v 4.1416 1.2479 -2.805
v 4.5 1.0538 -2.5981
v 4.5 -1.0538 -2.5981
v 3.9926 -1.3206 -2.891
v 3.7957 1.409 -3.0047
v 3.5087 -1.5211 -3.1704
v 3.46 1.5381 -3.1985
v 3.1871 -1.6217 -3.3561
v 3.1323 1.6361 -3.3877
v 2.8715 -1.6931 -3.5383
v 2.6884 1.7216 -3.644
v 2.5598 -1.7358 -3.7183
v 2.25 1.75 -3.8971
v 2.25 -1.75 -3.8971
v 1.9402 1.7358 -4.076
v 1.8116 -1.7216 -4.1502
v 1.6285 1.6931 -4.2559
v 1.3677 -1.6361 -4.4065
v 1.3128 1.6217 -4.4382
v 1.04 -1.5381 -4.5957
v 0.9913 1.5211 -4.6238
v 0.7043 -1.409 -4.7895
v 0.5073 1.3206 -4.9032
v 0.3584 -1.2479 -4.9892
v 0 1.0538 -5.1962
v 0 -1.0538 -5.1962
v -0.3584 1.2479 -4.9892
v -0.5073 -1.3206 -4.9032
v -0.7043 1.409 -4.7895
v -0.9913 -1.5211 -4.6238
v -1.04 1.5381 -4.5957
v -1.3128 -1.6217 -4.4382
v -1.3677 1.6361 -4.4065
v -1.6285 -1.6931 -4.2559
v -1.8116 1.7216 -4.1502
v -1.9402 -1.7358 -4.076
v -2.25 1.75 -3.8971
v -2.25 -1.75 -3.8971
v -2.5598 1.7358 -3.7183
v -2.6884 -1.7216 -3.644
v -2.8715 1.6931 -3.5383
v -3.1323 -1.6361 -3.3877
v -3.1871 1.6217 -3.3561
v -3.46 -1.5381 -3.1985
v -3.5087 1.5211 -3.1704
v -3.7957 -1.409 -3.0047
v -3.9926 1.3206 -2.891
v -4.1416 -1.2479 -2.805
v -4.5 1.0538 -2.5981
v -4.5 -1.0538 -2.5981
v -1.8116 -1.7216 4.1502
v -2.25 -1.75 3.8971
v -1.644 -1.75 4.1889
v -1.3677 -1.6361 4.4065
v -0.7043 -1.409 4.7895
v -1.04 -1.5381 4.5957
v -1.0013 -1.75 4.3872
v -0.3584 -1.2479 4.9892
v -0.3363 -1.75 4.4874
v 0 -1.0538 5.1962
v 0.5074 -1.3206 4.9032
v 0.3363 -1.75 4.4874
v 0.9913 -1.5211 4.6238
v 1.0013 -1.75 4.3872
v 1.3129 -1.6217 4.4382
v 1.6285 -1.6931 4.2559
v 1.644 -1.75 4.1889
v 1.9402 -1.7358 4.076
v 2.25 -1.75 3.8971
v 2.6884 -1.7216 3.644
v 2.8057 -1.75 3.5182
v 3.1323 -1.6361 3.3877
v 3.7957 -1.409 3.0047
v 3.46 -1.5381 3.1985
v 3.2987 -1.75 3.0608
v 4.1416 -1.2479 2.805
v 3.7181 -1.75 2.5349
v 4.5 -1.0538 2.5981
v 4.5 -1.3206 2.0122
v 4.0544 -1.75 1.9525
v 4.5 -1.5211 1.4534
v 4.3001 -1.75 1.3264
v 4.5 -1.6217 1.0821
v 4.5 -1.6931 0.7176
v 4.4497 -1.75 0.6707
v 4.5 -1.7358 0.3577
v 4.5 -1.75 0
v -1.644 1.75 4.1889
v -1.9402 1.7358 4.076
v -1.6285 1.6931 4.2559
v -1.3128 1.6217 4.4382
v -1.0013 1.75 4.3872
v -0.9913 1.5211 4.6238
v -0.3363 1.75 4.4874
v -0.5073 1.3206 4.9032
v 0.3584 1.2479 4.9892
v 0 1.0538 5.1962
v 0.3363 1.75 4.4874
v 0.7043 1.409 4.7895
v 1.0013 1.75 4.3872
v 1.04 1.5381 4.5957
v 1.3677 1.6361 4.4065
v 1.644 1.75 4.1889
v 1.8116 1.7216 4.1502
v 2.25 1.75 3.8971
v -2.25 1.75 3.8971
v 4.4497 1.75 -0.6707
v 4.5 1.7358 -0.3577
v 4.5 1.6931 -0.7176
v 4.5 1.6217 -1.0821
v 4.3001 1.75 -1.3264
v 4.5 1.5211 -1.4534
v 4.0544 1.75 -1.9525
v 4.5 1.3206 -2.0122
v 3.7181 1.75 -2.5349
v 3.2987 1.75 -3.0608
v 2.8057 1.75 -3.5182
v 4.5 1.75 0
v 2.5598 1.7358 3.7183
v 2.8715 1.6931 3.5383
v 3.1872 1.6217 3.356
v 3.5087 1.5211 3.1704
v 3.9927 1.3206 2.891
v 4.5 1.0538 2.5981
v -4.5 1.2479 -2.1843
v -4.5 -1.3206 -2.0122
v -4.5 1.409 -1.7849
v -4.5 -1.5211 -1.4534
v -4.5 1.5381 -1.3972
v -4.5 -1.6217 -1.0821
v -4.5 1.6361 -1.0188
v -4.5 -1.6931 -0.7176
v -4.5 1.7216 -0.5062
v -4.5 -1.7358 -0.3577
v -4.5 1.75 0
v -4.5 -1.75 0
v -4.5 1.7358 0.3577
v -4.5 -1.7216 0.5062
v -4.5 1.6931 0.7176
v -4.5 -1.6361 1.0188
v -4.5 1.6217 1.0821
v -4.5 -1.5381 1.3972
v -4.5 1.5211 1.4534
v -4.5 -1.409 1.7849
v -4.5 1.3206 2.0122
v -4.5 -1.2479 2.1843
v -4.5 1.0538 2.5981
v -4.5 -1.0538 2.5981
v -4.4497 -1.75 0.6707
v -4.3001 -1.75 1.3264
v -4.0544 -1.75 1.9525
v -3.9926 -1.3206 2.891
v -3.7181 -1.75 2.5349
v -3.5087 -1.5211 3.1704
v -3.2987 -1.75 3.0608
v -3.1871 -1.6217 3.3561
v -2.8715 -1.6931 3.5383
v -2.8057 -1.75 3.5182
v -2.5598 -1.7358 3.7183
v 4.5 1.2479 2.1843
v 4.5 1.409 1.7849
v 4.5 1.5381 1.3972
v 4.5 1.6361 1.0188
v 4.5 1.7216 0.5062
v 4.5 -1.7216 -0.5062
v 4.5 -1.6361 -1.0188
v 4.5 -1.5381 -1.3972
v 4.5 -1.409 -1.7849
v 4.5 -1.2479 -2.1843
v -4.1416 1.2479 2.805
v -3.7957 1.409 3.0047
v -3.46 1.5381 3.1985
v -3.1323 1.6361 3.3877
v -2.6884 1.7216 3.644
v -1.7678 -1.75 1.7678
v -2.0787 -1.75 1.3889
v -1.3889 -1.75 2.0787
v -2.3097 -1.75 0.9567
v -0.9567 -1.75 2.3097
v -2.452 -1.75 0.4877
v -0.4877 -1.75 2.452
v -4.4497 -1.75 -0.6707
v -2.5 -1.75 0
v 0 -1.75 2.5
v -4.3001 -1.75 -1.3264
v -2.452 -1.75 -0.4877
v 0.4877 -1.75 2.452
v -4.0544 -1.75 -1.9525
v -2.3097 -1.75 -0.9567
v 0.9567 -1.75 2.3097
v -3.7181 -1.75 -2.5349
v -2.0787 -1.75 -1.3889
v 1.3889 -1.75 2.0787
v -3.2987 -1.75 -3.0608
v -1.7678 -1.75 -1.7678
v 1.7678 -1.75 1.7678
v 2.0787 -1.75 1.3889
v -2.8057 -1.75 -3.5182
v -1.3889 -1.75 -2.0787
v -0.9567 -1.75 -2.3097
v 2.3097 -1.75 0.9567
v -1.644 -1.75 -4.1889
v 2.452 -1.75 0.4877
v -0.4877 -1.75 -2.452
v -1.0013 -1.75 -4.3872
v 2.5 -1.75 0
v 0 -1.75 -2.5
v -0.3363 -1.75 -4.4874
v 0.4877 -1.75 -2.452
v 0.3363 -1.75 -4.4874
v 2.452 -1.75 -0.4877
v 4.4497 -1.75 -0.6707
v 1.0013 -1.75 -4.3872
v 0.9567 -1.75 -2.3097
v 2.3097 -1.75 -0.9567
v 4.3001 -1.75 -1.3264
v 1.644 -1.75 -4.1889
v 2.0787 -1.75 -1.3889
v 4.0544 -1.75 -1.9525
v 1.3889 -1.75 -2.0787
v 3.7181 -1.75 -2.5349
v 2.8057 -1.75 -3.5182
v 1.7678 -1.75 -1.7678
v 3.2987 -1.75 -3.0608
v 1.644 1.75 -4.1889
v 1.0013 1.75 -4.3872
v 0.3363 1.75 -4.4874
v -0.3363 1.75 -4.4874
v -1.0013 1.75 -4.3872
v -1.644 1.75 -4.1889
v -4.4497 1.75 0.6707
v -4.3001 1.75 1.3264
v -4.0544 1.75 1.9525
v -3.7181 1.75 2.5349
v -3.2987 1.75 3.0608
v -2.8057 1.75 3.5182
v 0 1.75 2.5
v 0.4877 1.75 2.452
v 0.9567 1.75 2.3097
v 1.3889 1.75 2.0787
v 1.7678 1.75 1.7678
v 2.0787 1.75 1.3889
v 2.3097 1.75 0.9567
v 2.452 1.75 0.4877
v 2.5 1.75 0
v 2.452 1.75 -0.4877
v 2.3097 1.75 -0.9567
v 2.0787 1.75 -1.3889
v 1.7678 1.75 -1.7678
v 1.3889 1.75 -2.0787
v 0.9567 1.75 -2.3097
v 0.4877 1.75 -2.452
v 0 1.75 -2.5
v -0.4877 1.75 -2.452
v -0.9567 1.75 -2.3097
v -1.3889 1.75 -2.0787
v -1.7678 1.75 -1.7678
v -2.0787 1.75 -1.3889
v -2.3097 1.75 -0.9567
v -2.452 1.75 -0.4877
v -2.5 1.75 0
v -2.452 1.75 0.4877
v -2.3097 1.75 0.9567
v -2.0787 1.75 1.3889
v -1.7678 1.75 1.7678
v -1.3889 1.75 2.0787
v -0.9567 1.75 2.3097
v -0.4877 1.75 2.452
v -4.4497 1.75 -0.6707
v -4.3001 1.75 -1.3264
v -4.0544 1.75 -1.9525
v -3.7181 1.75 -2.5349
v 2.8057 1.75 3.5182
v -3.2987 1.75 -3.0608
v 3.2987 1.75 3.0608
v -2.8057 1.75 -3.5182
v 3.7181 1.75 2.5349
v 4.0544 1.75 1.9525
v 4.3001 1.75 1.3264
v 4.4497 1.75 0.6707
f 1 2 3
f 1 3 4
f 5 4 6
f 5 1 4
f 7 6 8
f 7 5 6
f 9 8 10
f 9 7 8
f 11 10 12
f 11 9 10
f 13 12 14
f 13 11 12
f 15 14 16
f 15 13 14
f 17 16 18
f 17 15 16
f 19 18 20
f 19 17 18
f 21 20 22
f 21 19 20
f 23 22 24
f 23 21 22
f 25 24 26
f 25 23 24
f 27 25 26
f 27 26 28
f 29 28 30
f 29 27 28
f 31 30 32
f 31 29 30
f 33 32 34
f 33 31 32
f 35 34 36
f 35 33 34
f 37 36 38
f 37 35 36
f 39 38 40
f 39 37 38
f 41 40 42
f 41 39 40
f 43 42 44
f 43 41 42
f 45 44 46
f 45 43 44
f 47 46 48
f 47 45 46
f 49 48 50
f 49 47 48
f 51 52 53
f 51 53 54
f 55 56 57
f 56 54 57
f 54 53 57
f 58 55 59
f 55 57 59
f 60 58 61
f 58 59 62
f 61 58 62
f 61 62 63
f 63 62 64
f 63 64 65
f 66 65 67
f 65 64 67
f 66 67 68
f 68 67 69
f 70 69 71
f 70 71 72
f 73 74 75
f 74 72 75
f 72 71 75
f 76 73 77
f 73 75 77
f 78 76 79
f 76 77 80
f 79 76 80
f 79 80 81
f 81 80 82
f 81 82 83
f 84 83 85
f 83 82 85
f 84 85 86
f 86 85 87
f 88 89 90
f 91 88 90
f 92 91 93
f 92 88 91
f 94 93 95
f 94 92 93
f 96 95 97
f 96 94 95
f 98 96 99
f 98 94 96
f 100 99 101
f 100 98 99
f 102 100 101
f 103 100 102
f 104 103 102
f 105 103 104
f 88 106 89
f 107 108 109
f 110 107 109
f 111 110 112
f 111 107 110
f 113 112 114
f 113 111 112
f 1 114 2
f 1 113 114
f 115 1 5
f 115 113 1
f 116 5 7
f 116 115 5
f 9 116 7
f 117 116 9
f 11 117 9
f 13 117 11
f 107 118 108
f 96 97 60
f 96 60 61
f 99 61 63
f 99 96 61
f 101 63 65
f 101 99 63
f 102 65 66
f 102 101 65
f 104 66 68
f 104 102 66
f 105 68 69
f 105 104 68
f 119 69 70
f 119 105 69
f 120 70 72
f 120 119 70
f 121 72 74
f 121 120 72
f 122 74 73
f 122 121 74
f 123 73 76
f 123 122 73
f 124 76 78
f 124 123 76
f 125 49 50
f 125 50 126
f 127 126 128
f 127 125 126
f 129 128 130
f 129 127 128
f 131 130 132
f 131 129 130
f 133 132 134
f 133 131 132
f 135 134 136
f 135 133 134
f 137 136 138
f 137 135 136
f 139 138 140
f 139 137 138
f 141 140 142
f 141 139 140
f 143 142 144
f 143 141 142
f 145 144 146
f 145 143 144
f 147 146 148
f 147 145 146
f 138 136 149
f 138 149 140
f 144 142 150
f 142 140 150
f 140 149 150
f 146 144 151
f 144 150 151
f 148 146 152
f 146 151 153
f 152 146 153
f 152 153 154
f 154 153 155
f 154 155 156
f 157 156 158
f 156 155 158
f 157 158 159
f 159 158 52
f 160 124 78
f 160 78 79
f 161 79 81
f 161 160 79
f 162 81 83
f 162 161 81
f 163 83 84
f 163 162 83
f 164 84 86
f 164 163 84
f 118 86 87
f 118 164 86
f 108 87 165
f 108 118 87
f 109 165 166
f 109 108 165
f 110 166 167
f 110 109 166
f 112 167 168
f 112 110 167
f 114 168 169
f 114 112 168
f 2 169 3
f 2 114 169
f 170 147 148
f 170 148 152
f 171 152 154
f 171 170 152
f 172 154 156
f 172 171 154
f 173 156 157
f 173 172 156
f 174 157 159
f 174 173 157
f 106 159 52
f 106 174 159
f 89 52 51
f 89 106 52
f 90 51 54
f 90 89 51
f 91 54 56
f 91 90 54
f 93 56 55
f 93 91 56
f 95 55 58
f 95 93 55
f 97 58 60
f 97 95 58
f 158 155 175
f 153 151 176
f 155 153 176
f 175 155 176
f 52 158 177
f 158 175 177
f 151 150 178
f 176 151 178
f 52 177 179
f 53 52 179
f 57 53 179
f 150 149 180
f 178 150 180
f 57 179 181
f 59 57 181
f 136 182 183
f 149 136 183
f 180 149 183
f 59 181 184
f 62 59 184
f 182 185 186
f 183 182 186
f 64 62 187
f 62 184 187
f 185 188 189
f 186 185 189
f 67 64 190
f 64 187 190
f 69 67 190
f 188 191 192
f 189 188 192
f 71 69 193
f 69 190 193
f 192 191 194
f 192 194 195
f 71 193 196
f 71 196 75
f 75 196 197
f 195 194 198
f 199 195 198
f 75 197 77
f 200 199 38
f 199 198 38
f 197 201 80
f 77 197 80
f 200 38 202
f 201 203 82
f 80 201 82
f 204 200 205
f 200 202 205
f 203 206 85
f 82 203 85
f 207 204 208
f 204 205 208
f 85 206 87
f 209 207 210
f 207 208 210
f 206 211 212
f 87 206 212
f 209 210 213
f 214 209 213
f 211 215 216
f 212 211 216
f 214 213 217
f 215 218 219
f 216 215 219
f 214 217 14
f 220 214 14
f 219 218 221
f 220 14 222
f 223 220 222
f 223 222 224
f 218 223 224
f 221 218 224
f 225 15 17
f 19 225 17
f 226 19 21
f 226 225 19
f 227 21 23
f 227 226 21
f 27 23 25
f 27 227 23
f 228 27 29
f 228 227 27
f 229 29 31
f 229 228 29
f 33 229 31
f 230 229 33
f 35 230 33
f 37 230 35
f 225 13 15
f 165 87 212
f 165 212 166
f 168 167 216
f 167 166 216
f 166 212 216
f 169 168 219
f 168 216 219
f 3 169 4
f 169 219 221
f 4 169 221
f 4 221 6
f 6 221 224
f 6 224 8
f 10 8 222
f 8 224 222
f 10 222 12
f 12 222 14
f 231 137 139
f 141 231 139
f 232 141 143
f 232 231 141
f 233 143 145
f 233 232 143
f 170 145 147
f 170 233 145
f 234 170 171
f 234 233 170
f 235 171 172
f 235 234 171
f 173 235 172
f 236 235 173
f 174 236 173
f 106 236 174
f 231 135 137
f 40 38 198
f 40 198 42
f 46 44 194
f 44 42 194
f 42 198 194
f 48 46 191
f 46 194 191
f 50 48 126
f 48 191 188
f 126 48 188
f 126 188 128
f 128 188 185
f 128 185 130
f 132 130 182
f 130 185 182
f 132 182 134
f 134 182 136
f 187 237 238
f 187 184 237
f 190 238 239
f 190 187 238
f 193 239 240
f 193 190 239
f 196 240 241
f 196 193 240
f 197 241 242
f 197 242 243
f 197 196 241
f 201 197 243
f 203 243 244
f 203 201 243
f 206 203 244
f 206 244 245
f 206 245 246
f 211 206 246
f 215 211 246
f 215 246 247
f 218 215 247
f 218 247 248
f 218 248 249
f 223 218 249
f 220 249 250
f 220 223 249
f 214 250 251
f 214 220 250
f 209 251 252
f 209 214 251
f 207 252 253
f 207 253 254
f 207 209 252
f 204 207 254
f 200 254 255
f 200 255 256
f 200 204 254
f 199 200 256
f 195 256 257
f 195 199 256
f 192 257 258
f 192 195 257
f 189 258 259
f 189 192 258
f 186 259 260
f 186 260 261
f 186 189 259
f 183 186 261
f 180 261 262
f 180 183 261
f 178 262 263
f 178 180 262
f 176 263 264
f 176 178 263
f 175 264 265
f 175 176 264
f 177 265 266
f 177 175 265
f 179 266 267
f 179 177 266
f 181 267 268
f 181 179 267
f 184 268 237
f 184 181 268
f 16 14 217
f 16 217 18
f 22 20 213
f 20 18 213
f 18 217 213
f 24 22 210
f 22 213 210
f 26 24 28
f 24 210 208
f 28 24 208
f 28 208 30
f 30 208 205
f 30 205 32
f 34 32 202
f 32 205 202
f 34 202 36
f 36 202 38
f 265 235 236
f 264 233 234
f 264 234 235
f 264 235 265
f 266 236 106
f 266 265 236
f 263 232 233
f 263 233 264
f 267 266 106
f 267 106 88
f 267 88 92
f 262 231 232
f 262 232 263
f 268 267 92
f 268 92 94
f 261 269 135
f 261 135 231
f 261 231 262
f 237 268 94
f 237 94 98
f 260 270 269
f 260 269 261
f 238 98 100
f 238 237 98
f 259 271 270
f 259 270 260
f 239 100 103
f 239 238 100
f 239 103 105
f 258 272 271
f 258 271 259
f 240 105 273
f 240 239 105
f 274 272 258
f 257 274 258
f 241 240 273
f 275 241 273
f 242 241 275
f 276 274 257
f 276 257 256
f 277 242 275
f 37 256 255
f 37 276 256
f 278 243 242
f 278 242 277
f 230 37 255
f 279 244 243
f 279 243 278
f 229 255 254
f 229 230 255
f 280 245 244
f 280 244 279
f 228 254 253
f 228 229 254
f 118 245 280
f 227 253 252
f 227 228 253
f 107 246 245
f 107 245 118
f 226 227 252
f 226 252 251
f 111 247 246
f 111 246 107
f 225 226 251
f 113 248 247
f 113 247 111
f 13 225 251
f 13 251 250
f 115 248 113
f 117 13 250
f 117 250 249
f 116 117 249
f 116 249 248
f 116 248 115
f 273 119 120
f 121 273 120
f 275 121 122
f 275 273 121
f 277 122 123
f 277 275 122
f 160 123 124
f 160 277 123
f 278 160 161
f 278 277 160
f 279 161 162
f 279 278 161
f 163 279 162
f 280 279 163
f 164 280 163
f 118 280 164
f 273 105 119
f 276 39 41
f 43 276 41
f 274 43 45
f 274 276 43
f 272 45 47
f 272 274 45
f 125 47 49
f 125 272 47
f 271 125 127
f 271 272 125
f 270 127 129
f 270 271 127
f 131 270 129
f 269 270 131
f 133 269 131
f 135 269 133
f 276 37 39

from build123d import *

# Parameters (mm, degrees)
SKETCH1_R           = 2.5
BOSS_EXTRUDE1_DEPTH = 1.75


with BuildPart() as part:
    # Sketch1 → Boss-Extrude1 (new, symmetric)
    with BuildSketch(Plane(origin=(0, 0, 0), x_dir=(1, 0, 0), z_dir=(0, 1, 0))):
        Polygon((0, 5.196152423), (-4.5, 2.598076211), (-4.5, -2.598076211), (0, -5.196152423), (4.5, -2.598076211), (4.5, 2.598076211), align=None)
        with Locations(Location((0, 0, 0), (0, 0, 270))):
            Circle(SKETCH1_R, mode=Mode.SUBTRACT)
    extrude(amount=BOSS_EXTRUDE1_DEPTH, both=True)

    # Cut-Sweep1: sweep along a path in Sketch2
    with BuildLine(Plane(origin=(0, 1.75, 0), x_dir=(1, 0, 0), z_dir=(0, 1, 0))) as cut_sweep1_path:
        CenterArc((0, 0), 4.5, 0, 360)
    # Sketch3 → Cut-Sweep1 (sweep, cut)
    with BuildSketch(Plane.XY):
        Polygon((-5.25, 1), (-4.5, 1.75), (-5.25, 1.75), align=None)
    cut_sweep1 = sweep(path=cut_sweep1_path.line, mode=Mode.SUBTRACT)

    # Mirror1: Cut-Sweep1 across plane
    add(cut_sweep1.mirror(Plane.ZX), mode=Mode.SUBTRACT)


solid = part.part
